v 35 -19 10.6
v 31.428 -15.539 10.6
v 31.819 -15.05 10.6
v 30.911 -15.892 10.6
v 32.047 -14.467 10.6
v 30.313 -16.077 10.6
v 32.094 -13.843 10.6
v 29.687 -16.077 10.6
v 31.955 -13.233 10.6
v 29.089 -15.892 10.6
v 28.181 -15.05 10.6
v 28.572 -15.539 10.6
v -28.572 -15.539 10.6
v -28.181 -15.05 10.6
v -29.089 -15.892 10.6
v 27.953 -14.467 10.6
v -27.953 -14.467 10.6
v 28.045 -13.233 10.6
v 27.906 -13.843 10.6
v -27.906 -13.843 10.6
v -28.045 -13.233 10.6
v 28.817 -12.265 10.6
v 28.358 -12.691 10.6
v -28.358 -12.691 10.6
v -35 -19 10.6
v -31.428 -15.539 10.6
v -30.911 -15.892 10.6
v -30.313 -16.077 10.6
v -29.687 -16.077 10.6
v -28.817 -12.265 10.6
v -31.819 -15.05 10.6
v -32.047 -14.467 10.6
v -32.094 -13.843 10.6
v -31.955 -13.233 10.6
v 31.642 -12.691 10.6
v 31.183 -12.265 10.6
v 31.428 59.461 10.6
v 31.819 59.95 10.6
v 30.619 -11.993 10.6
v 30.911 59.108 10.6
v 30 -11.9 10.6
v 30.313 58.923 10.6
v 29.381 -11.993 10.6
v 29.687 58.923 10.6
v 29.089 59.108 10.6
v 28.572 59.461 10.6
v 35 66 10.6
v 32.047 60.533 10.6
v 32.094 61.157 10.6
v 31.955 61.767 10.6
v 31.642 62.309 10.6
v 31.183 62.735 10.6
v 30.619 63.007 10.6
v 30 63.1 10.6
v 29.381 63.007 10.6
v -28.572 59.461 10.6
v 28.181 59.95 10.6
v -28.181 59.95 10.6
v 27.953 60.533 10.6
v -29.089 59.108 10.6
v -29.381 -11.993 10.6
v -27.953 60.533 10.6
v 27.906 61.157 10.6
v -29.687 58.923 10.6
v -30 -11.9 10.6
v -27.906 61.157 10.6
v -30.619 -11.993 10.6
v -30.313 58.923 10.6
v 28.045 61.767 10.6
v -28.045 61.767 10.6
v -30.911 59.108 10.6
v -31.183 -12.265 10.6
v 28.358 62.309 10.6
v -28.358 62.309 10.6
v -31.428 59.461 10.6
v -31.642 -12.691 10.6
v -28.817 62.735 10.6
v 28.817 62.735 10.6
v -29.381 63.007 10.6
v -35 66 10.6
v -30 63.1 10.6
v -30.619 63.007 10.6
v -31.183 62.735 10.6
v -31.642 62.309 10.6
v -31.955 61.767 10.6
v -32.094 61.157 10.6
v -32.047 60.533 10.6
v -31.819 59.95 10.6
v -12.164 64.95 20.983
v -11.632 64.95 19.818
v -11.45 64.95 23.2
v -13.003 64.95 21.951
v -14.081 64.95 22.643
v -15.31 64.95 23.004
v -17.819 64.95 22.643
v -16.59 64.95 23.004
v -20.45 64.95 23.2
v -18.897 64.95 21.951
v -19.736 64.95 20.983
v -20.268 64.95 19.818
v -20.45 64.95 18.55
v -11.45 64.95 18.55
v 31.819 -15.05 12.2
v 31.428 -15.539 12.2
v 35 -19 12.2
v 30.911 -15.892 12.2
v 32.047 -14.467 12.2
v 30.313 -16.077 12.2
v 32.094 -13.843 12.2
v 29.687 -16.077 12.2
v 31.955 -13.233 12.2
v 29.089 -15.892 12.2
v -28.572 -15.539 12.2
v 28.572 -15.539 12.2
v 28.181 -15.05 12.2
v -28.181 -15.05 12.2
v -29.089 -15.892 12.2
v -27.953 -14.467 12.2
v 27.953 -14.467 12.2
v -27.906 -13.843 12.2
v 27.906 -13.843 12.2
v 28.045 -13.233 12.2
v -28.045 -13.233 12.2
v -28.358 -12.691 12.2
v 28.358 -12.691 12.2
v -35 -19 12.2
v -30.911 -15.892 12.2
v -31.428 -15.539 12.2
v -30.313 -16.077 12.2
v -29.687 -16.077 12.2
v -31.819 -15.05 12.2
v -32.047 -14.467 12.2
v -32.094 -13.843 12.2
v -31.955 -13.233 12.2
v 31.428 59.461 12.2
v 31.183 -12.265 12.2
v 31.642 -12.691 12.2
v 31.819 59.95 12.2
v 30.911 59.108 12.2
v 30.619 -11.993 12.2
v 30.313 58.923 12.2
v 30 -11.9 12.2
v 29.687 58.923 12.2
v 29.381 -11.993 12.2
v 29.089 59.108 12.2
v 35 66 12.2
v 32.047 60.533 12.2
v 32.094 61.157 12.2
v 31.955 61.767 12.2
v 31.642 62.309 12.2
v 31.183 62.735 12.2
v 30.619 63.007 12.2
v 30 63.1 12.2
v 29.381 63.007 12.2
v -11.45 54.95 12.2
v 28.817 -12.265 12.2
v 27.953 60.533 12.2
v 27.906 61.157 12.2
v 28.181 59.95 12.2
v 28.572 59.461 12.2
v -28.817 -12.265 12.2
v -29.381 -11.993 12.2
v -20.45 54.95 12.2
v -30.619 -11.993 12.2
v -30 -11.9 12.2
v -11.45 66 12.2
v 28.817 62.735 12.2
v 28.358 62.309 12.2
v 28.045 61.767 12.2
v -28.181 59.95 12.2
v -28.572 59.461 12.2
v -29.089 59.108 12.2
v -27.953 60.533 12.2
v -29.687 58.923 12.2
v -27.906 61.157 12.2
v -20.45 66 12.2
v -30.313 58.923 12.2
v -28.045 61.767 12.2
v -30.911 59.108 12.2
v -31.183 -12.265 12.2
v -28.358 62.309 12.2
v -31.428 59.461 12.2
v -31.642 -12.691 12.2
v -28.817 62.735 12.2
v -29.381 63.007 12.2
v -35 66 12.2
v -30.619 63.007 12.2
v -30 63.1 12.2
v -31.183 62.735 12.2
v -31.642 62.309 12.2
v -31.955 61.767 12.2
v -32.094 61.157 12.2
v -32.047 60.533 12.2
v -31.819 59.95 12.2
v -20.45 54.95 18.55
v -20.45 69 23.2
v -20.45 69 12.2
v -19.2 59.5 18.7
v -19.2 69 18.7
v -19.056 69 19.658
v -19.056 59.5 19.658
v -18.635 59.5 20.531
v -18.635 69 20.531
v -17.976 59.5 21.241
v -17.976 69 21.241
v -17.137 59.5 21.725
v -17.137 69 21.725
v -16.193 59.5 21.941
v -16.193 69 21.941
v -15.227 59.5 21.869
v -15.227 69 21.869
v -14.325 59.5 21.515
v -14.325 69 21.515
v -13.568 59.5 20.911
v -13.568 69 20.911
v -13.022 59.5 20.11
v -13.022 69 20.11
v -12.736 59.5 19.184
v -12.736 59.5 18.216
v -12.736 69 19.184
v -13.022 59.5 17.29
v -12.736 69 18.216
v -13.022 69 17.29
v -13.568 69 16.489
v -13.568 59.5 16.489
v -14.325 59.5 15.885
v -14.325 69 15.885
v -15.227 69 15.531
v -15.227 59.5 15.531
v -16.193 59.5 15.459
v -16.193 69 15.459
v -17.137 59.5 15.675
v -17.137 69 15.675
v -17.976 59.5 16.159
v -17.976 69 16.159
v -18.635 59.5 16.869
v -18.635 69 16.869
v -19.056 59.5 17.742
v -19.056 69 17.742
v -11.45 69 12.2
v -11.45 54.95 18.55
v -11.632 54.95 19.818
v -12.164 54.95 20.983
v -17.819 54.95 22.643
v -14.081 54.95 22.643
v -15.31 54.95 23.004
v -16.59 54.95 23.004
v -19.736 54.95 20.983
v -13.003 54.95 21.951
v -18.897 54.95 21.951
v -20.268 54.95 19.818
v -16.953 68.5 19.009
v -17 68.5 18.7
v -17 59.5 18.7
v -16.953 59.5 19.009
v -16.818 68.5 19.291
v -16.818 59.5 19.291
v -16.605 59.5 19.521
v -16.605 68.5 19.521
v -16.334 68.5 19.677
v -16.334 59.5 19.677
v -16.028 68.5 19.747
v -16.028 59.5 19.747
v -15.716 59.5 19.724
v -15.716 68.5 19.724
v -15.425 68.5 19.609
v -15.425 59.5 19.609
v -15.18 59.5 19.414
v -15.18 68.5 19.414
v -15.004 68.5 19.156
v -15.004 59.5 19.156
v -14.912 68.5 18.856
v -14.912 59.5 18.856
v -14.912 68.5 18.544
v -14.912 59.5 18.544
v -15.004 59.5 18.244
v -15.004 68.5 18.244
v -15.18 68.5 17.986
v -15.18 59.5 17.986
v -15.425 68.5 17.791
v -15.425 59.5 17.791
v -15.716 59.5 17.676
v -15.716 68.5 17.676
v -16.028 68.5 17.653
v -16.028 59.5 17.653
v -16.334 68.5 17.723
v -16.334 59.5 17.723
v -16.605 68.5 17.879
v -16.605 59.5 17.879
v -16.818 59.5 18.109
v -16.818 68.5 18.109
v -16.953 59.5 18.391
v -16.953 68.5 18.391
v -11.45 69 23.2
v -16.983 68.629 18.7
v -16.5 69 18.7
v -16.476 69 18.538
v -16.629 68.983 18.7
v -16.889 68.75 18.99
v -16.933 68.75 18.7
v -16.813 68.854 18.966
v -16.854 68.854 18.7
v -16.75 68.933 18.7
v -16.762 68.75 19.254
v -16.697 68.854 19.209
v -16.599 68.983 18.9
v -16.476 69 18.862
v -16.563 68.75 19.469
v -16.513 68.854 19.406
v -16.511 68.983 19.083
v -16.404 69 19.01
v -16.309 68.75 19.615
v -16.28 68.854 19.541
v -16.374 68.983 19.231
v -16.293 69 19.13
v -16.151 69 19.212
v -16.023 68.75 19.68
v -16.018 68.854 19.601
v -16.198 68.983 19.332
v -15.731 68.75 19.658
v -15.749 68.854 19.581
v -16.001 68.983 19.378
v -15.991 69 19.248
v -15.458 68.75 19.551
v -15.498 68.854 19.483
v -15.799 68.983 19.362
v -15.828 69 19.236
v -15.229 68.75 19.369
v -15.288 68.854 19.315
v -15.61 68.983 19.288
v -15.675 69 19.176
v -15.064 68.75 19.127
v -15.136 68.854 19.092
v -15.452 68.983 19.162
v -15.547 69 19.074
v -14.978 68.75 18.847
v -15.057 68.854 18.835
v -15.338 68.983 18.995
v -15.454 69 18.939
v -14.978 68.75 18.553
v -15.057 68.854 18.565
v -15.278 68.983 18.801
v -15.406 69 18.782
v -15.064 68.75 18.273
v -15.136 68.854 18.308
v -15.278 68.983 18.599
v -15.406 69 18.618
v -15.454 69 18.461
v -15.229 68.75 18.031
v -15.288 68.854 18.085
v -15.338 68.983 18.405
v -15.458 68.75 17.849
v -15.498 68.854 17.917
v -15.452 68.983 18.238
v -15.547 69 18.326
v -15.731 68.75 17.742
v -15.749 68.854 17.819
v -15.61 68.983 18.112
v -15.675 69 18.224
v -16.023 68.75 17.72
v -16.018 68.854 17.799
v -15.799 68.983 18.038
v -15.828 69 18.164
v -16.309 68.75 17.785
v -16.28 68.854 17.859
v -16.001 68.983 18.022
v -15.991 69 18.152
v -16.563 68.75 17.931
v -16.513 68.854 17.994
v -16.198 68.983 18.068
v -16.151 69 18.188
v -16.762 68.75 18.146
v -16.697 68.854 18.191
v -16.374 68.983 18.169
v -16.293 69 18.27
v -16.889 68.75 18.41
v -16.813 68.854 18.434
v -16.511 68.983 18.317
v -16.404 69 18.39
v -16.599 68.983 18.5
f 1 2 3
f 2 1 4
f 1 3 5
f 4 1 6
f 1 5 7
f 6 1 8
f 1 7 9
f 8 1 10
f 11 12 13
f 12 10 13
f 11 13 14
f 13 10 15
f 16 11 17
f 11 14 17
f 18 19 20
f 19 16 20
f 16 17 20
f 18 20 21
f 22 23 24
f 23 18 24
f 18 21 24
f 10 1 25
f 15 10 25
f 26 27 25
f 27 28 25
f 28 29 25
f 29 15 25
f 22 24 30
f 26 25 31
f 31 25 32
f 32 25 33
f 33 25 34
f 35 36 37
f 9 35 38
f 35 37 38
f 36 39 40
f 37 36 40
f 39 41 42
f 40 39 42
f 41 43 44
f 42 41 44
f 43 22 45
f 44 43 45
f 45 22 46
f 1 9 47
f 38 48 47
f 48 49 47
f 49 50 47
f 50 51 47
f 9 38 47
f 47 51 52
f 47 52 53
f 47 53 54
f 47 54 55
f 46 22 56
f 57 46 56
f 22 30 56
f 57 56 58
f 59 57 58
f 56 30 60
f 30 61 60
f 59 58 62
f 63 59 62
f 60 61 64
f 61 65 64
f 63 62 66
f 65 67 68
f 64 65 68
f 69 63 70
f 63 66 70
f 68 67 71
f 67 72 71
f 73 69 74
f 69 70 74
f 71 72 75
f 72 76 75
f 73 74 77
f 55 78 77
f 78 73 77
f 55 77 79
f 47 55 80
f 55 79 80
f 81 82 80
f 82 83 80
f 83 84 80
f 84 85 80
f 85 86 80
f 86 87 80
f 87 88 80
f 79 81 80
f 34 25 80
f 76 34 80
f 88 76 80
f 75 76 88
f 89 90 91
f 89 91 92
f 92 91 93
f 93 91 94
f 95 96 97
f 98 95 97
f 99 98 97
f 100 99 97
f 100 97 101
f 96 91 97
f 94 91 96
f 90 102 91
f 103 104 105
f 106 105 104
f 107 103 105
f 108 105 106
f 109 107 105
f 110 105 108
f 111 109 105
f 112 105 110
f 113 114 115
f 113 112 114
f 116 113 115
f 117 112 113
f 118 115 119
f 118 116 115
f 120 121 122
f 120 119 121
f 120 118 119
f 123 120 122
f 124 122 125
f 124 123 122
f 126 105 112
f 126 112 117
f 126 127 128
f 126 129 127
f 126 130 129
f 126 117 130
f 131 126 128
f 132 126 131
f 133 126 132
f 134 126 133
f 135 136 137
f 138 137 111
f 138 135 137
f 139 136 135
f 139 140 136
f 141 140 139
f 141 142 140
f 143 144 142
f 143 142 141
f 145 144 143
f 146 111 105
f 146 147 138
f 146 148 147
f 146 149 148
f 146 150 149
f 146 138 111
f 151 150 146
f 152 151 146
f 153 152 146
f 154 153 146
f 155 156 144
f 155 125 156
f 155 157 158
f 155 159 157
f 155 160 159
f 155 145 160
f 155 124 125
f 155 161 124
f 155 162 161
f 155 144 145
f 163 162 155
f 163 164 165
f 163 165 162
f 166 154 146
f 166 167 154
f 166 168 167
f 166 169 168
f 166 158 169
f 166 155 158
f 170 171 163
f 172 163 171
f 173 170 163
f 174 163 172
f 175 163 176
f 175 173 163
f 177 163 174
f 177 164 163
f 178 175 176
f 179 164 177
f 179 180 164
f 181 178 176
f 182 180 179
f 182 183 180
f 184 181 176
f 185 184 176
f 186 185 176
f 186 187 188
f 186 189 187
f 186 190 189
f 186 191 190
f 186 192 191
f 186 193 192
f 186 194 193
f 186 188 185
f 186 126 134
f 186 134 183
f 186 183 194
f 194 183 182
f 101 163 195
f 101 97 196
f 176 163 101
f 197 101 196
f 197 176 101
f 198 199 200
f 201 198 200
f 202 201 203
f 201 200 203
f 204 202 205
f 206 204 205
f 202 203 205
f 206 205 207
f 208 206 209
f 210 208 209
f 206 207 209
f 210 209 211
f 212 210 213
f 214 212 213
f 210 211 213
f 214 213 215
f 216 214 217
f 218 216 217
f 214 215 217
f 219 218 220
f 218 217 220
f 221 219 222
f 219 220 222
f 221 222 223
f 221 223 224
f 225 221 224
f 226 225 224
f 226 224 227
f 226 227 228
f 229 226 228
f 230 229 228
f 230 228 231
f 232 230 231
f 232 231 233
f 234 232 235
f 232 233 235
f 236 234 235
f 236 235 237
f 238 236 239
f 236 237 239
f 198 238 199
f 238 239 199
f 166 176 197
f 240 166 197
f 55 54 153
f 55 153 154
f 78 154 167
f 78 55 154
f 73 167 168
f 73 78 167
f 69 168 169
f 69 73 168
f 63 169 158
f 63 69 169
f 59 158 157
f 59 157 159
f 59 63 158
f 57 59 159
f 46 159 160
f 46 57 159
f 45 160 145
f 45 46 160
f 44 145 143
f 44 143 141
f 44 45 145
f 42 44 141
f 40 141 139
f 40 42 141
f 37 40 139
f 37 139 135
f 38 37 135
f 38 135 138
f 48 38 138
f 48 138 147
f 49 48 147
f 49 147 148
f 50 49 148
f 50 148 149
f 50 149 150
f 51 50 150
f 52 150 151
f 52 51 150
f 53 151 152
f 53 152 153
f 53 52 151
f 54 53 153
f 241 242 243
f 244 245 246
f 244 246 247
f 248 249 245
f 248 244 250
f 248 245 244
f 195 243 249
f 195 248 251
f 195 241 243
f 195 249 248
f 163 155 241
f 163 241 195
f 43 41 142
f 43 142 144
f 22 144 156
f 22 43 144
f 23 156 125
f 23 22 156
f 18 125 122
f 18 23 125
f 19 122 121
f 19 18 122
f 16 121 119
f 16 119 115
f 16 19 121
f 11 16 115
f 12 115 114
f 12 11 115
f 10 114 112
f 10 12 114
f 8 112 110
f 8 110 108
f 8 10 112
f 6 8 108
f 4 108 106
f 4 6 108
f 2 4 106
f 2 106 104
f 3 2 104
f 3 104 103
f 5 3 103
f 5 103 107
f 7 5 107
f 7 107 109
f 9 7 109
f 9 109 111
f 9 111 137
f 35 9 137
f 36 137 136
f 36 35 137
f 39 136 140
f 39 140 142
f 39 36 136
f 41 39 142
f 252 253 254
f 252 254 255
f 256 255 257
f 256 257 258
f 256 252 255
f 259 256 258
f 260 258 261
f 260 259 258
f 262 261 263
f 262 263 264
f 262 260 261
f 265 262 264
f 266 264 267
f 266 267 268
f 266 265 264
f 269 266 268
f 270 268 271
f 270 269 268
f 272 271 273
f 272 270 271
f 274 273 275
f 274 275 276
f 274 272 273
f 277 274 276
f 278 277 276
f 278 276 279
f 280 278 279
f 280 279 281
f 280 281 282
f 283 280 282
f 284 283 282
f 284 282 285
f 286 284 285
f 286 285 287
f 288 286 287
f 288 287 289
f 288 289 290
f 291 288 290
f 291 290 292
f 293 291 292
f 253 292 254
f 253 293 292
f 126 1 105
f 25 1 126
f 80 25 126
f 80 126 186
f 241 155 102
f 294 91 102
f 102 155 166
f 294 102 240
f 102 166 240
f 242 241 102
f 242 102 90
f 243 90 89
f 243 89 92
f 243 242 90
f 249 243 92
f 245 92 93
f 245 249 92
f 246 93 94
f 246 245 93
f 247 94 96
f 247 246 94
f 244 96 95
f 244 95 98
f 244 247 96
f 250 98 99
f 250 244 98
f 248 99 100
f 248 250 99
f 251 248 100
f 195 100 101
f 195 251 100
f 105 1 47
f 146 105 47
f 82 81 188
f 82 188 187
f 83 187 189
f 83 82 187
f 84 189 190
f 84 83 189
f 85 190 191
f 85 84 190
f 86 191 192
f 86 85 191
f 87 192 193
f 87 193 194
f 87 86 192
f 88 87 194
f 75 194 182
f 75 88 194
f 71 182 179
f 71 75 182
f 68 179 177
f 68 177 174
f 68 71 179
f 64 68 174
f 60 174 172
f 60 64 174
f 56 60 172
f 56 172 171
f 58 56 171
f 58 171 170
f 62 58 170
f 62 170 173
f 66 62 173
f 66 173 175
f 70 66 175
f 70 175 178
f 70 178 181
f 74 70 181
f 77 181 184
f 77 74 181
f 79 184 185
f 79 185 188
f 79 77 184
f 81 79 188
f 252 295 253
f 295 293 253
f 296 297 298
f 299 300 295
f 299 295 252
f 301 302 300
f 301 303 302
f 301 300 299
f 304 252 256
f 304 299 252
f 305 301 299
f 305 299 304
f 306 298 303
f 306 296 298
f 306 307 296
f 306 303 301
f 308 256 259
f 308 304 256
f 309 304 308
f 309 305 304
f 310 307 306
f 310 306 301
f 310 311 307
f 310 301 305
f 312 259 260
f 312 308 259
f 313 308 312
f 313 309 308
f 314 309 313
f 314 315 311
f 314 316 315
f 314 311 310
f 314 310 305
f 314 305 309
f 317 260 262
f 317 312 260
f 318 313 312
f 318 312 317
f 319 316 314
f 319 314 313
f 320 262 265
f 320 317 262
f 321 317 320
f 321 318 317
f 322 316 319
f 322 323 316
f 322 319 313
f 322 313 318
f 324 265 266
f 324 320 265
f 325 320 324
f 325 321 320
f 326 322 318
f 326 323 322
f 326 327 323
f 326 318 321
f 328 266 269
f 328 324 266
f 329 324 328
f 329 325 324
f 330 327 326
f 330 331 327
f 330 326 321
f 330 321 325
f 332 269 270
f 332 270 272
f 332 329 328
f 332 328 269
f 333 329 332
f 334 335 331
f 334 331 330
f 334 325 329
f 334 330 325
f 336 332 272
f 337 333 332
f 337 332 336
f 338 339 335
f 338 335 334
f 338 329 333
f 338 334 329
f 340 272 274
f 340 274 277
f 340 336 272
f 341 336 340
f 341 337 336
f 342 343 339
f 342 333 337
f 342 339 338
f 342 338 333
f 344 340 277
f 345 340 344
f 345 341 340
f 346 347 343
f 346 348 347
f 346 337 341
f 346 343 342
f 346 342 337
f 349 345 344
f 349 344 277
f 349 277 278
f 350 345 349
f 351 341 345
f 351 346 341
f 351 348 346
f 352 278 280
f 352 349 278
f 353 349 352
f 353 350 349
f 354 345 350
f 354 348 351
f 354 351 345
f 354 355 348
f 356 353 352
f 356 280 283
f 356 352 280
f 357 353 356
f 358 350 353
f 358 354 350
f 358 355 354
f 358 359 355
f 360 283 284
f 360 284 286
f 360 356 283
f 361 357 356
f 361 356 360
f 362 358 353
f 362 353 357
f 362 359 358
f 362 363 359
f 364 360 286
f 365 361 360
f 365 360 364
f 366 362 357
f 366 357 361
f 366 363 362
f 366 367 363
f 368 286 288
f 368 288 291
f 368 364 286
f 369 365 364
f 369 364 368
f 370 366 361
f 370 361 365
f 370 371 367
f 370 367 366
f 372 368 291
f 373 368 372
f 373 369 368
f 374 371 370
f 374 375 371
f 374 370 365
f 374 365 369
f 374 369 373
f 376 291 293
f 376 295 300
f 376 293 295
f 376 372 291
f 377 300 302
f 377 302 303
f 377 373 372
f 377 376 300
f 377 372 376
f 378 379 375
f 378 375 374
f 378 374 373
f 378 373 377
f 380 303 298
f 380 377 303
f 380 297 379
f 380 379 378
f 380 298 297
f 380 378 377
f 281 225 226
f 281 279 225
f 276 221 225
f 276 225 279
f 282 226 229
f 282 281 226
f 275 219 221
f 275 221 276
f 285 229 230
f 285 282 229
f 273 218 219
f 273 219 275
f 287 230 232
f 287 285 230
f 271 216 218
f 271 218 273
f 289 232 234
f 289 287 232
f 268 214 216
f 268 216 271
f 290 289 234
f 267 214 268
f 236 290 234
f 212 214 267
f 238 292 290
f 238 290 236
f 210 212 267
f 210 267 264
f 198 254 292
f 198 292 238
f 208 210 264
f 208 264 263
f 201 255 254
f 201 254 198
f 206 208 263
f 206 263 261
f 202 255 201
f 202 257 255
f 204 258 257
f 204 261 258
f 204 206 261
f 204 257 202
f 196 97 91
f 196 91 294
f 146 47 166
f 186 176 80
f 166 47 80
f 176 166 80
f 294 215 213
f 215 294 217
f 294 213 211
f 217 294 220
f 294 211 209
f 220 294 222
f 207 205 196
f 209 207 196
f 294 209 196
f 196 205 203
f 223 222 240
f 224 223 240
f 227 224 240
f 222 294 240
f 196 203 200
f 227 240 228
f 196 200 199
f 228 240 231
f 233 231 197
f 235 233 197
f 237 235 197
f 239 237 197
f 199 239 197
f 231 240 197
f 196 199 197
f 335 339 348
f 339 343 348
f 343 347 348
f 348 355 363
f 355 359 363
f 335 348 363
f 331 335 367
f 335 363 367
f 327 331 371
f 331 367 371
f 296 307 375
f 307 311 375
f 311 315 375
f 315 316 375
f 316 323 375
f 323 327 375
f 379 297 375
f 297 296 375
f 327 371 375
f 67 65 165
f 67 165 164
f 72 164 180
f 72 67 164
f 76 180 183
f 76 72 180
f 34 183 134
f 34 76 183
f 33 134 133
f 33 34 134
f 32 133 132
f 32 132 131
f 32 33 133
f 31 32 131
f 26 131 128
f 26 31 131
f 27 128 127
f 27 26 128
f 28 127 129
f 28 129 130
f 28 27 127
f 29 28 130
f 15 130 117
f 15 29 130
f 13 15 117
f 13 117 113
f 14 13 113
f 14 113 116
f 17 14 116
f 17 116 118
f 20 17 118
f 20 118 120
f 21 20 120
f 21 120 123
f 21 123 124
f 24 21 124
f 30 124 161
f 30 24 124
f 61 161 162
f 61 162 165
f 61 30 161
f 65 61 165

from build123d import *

# Parameters (mm, degrees)
SKETCH004_W             = 85
SKETCH004_H             = 70
SKETCH004_R             = 2.1
PAD003_DEPTH            = 1.6
SKETCH005_W             = 14.05
SKETCH005_H             = 9
PAD004_DEPTH            = 11
SKETCH006_R             = 3.25
SKETCH006_R_2           = 1.05
POCKET001_DEPTH         = 9.5
FILLET_R                = 0.5
POCKET002_DEPTH         = 10
BODY002_PLACEMENT_ANGLE = 90


with BuildPart() as part:
    # Sketch004 → Pad003 (new body)
    with BuildSketch(Plane.XY):
        with Locations((-7.5, 0)):
            Rectangle(SKETCH004_W, SKETCH004_H)
        with Locations((-45, -30)):
            Circle(SKETCH004_R, mode=Mode.SUBTRACT)
        with Locations((30, -30)):
            Circle(SKETCH004_R, mode=Mode.SUBTRACT)
        with Locations((-45, 30)):
            Circle(SKETCH004_R, mode=Mode.SUBTRACT)
        with Locations((30, 30)):
            Circle(SKETCH004_R, mode=Mode.SUBTRACT)
    extrude(amount=PAD003_DEPTH)

    # Sketch005 (on Face10 of Pad003) → Pad004 (join)
    with BuildSketch(Plane.XY.offset(1.6)):
        with Locations((30.975, 15.95)):
            Rectangle(SKETCH005_W, SKETCH005_H)
    extrude(amount=PAD004_DEPTH)

    # Sketch006 (on Face15 of Pad004) → Pocket001 (cut)
    with BuildSketch(Plane.YZ.offset(38)):
        with Locations((15.95, 8.1)):
            Circle(SKETCH006_R)
        with Locations((15.95, 8.1)):
            Circle(SKETCH006_R_2, mode=Mode.SUBTRACT)
    extrude(amount=-POCKET001_DEPTH, mode=Mode.SUBTRACT)

    # Fillet
    fillet_edges = [part.edges().sort_by_distance(p)[0] for p in [
        (38, 14.9, 8.1),
    ]]
    fillet(fillet_edges, radius=FILLET_R)

    # Sketch007 (on Face11 of Fillet) → Pocket002 (cut)
    with BuildSketch(Plane(origin=(23.95, 0, 0), x_dir=(0, -1, 0), z_dir=(-1, 0, 0))):
        with BuildLine():
            ThreePointArc((-11.45, 7.95), (-15.95, 12.45), (-20.45, 7.95))
            Line((-20.45, 7.95), (-20.45, 12.6))
            Line((-20.45, 12.6), (-11.45, 12.6))
            Line((-11.45, 12.6), (-11.45, 7.95))
        make_face()
    extrude(amount=-POCKET002_DEPTH, mode=Mode.SUBTRACT)


with BuildPart() as part_1:
    # Body002 placement: moved
    add(part.part.moved(Location((0, 31, 10.6))).rotate(Axis((0, 31, 10.6), (0, 0, 1)), BODY002_PLACEMENT_ANGLE))


solid = part_1.part
